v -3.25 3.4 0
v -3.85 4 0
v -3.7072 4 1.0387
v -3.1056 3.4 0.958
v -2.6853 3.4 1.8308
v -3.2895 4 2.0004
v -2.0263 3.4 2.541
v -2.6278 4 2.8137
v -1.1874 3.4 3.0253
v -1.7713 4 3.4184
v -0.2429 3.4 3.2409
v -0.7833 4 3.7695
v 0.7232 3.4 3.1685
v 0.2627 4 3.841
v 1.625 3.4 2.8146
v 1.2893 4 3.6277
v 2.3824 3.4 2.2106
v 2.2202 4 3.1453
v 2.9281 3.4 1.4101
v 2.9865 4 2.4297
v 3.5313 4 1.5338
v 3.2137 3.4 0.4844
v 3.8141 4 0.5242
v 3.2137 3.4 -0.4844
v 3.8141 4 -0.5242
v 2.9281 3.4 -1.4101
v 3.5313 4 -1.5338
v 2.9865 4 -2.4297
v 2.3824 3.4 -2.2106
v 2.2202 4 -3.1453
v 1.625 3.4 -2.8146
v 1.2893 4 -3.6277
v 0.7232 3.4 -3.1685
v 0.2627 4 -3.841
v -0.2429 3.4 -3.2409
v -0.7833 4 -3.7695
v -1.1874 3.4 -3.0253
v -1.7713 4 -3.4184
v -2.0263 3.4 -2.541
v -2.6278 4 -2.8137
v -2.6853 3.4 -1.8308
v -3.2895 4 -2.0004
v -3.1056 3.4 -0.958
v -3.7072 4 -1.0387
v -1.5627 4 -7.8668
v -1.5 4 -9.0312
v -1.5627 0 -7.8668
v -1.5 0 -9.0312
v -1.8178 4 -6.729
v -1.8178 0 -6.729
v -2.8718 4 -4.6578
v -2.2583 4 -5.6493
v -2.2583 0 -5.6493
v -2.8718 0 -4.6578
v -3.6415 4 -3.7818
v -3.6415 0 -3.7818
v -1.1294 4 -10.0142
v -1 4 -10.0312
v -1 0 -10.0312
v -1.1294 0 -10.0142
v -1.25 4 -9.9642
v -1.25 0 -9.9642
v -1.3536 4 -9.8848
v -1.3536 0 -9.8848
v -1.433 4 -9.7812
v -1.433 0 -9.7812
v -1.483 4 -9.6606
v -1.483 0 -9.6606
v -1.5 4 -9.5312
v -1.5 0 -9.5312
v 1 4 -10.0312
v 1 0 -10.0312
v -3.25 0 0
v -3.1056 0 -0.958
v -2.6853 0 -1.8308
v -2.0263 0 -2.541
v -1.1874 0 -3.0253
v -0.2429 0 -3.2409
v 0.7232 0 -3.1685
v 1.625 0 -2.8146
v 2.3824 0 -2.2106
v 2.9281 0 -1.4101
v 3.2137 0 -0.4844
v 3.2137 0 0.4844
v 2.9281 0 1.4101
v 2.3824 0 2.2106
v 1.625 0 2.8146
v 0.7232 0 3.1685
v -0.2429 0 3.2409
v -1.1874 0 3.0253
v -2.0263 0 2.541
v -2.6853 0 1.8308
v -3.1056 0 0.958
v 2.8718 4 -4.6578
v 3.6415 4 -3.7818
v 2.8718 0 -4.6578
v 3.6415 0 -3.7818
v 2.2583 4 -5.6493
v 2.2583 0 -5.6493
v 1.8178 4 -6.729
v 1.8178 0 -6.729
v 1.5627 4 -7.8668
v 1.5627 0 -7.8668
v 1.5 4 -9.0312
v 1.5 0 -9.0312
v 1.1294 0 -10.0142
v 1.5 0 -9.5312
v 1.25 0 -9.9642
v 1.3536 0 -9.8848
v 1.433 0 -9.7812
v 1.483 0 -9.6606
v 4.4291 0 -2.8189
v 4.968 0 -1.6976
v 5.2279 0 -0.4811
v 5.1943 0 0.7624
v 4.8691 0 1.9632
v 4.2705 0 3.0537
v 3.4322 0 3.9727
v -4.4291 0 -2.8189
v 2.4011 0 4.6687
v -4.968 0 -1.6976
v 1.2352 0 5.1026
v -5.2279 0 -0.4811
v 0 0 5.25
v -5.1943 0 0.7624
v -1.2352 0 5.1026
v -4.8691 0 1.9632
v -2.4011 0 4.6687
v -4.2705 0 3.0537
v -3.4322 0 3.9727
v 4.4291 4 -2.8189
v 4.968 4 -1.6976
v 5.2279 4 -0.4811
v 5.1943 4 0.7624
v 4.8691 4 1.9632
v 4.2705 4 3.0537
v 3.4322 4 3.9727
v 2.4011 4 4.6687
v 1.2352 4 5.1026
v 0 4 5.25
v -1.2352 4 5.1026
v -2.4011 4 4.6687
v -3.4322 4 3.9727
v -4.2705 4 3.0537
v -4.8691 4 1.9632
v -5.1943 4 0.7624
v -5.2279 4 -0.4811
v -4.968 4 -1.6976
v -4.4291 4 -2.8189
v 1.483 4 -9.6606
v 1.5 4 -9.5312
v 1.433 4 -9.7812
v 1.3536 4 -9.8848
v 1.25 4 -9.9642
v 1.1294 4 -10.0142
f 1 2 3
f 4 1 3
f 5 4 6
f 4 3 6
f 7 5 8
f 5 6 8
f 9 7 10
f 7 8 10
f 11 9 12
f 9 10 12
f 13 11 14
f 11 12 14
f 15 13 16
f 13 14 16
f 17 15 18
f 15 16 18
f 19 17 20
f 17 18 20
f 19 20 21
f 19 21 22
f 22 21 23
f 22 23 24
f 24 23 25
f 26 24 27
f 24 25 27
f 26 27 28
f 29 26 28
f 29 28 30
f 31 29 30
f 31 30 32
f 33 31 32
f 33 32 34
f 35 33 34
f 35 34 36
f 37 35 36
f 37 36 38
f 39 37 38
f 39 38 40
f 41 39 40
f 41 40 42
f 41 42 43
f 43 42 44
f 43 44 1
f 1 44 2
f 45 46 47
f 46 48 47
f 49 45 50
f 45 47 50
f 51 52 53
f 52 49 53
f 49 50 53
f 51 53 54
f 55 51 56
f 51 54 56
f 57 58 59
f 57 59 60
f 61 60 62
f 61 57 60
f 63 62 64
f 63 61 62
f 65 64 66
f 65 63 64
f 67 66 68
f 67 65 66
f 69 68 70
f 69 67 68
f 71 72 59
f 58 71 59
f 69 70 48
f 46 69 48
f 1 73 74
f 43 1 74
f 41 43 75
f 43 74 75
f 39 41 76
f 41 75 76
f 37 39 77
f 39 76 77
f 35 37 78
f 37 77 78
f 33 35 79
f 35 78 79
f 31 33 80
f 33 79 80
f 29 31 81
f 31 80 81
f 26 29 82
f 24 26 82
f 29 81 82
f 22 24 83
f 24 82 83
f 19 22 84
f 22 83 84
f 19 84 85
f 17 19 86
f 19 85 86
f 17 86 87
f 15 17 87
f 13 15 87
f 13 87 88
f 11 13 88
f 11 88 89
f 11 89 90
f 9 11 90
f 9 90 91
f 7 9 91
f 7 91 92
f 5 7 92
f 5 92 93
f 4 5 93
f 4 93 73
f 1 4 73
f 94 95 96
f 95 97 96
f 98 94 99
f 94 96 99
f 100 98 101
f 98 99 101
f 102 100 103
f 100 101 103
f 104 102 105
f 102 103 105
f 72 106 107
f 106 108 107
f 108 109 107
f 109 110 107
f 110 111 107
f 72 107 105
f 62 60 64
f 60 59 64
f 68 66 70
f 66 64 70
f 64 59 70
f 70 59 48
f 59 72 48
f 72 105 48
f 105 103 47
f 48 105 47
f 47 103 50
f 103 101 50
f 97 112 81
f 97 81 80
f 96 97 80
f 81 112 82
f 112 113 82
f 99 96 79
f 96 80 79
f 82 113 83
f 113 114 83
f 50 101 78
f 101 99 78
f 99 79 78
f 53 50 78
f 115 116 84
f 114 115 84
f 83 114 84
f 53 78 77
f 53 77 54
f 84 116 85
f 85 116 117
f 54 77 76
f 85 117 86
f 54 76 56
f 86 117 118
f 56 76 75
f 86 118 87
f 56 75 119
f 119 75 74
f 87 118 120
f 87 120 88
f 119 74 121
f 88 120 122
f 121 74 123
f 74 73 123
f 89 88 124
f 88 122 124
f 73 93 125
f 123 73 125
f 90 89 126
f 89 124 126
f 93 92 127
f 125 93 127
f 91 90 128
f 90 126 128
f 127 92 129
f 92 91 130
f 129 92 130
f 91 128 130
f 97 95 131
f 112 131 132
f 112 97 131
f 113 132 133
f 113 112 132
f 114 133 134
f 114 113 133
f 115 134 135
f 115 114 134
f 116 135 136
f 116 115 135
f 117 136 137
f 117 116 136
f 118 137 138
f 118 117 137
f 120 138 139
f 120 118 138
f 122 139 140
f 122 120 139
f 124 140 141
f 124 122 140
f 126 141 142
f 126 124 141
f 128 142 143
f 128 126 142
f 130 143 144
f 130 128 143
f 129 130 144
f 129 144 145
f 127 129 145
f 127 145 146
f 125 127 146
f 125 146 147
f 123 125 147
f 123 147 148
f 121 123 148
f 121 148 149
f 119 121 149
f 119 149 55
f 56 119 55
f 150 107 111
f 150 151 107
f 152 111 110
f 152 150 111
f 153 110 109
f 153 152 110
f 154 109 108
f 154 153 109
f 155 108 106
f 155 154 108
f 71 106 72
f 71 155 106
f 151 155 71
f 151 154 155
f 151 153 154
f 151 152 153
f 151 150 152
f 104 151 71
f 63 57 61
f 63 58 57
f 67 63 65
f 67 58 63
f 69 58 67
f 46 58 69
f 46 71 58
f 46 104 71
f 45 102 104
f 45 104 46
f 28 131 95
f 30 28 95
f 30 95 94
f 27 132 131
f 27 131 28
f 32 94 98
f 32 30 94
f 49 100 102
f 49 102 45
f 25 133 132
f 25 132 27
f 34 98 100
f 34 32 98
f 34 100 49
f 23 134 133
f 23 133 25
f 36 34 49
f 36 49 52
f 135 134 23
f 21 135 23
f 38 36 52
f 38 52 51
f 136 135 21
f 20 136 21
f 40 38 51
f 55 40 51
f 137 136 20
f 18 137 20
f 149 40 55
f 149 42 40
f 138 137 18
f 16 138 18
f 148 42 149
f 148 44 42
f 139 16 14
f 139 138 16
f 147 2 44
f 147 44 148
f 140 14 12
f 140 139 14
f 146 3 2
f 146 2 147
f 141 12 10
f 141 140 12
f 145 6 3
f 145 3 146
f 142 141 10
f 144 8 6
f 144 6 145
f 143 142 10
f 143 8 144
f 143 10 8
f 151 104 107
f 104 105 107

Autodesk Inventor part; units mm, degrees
ref_plane "YZ Plane" through (0, 0, 0) normal (1, 0, 0) x (0, 1, 0)
ref_plane "XZ Plane" through (0, 0, 0) normal (0, 1, 0) x (-1, 0, 0)
ref_plane "XY Plane" through (0, 0, 0) normal (0, 0, 1) x (1, 0, 0)
sketch "Sketch1" plane through (0, 0, 0) normal (0, 1, 0) x (-1, 0, 0)
  circle A0 centre (0, 0) radius 3.25
  circle A1 centre (0, 0) radius 5.25
  line L0 (1.5, -5.0312) -> (-1.5, -5.0312)
  line L1 (-1.5, -5.0312) -> (-1.5, -10.0312)
  line L2 (-1.5, -10.0312) -> (1.5, -10.0312)
  line L3 (1.5, -10.0312) -> (1.5, -5.0312)
  line L4 (0, 0) -> (0, -10.0312)
  arc A2 (3.6415, -3.7818) -> (1.5, -9.0312) centre (8.4969, -8.8241) ccw
  arc A3 (-1.5, -9.0312) -> (-3.6415, -3.7818) centre (-8.4969, -8.8241) ccw
  dimension "d0" = 6.5
  dimension "d1" = 2
  dimension "d2" = 1.5
  dimension "d3" = 5
  dimension "d4" = 7
  dimension "d5" = 4
  dimension "d6" = 7
extrude "Extrusion1" add sketch "Sketch1" along normal blind 4
sketch "Sketch2" plane through (0, 4, 0) normal (0, 1, 0) x (1, 0, 0)
  arc A0 (-3.6415, 3.7818) -> (-1.5, 9.0312) centre (-8.4969, 8.8241) ccw projected
  arc A1 (-3.6415, 3.7818) -> (3.6415, 3.7818) centre (0, 0) ccw projected
  arc A2 (1.5, 9.0312) -> (3.6415, 3.7818) centre (8.4969, 8.8241) ccw projected
  line L0 (1.5, 9.0312) -> (1.5, 10.0312) projected
  line L1 (1.5, 10.0312) -> (-1.5, 10.0312) projected
  line L2 (-1.5, 10.0312) -> (-1.5, 9.0312) projected
  circle A3 centre (0, 0) radius 3.25 projected
  line L3 (-8.6908, -12.2142) -> (10.4061, -12.2142)
  line L4 (10.4061, -12.2142) -> (10.4061, 17.7463)
  line L5 (10.4061, 17.7463) -> (-8.6908, 17.7463)
  line L6 (-8.6908, 17.7463) -> (-8.6908, -12.2142)
fillet "Fillet2" radius 0.5 2 edges at (1.5, 2, -10.0312) (-1.5, 2, -10.0312)
chamfer "Chamfer1" distance 0.6 angle 45 1 edges at (3.25, 4, 0)
sketch "Sketch3" plane through (1.5, 0, -9.0312) normal (1, 0, 0) x (0, 0, -1)
  line L0 (-5.2494, 4) -> (0, 4) construction
  line L1 (-2, 6) -> (1, 6)
  line L2 (1, 0) -> (1, 4) construction
  line L3 (1, 6) -> (1, 4)
  line L4 (0, 4) -> (1, 4) construction
  line L5 (-6, 4) -> (-2, 6)
  line L6 (-6, 4) -> (1, 4)
  point P0 (-9.0312, 0)
  dimension "d9" = 2
  dimension "d10" = 7
  dimension "d11" = 3
equation "\"d6\" = d4"
properties part number "thumb_bolt_converter"
